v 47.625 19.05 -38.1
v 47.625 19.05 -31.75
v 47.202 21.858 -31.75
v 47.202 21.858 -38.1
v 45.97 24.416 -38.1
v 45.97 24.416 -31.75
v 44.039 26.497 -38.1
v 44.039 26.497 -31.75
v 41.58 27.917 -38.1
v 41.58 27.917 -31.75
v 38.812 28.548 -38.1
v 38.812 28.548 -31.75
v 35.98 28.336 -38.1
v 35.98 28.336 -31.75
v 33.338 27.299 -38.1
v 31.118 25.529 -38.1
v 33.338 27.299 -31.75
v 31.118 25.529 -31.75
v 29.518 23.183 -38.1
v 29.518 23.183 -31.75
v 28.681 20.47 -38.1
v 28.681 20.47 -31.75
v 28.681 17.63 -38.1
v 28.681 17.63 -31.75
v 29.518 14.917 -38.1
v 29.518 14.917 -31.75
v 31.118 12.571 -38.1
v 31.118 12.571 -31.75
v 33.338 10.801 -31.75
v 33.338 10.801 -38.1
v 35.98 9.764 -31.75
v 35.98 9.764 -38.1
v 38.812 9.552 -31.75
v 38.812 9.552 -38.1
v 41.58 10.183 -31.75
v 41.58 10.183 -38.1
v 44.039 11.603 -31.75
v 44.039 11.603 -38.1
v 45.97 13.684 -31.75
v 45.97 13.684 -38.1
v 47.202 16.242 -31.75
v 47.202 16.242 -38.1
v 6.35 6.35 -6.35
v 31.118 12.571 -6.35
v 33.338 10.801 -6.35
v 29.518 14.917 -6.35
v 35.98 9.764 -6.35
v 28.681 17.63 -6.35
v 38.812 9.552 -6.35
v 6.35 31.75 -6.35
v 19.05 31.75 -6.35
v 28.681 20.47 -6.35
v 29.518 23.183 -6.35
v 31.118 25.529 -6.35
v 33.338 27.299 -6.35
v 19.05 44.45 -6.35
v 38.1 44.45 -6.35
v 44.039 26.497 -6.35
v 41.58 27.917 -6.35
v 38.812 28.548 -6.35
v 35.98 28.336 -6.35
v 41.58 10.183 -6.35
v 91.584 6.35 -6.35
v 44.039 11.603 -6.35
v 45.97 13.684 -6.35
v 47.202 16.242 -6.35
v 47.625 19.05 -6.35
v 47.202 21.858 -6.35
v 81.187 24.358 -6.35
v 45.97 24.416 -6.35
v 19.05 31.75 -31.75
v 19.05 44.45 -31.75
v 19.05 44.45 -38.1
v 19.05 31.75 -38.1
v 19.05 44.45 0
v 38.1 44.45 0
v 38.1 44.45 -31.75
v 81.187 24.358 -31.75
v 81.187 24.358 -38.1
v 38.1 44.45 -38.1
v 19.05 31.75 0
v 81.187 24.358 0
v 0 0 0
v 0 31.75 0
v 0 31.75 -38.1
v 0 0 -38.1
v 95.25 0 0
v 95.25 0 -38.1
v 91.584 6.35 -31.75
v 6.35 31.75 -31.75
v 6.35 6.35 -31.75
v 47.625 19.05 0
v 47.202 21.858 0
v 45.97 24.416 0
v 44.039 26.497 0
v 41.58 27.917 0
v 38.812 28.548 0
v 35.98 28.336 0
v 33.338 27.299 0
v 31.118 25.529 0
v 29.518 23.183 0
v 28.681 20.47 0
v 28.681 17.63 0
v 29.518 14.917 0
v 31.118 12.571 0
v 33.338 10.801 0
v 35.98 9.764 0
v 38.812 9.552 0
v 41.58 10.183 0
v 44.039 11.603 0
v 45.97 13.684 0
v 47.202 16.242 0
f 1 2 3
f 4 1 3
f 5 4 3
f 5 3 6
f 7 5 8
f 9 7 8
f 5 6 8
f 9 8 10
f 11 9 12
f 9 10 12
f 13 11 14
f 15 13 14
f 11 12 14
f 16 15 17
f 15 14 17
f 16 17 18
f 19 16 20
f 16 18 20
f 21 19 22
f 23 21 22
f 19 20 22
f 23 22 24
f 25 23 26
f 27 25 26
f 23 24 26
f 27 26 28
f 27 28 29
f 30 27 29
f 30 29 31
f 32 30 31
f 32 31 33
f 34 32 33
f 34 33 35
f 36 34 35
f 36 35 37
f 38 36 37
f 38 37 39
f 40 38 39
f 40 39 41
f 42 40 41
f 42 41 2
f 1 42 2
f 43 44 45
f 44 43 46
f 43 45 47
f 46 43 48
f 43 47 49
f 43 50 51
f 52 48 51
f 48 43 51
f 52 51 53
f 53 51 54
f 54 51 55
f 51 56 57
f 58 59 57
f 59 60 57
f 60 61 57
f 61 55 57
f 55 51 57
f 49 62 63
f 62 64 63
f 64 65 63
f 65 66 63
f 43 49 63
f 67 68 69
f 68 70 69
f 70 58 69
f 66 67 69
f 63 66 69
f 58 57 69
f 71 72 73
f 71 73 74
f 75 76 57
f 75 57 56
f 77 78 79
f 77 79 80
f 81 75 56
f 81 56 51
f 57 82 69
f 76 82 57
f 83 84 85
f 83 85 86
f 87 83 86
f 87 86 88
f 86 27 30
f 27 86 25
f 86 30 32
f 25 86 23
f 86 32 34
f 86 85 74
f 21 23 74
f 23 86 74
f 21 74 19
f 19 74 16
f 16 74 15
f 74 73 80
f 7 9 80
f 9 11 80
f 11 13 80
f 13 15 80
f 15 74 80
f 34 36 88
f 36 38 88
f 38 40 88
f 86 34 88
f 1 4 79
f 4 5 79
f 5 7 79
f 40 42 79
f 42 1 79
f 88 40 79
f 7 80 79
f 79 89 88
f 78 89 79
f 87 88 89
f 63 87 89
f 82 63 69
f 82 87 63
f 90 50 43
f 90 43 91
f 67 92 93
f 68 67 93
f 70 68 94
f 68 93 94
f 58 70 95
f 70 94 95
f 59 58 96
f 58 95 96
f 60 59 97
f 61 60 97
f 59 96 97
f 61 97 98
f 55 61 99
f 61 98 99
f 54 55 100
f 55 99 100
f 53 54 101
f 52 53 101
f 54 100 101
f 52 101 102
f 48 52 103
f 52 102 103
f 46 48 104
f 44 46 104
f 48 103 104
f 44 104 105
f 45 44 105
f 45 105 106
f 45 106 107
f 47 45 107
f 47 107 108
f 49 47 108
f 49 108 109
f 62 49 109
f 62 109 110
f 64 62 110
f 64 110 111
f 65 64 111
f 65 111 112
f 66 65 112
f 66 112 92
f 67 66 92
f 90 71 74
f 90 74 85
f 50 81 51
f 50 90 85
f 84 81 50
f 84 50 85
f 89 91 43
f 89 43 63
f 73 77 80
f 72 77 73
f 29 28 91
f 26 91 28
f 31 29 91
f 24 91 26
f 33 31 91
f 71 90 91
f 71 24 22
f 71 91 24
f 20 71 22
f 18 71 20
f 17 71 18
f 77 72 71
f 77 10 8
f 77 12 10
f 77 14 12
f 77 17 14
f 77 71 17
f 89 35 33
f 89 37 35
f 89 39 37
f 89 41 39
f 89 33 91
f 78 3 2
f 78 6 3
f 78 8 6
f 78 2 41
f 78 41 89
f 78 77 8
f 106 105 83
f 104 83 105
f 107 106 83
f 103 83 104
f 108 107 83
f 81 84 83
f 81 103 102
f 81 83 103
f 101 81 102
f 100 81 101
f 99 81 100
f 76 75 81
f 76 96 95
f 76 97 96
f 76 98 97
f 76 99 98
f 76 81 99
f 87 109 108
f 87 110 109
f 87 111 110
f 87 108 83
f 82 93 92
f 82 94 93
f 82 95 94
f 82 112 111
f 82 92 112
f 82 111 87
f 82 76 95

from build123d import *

# Parameters (mm, degrees)
BOSS_EXTRUDE1_DEPTH = 38.1
SKETCH2_R           = 9.525
CUT_EXTRUDE1_DEPTH  = 39.1
SKETCH3_W           = 88.9
SKETCH3_H           = 25.4
CUT_EXTRUDE2_DEPTH  = 38.1


with BuildPart() as part:
    # Sketch1 → Boss-Extrude1 (new body)
    with BuildSketch(Plane.XY):
        Polygon((0, 0), (95.25, 0), (81.186706555, 24.358338769), (38.1, 44.45), (19.05, 44.45), (19.05, 31.75), (0, 31.75), align=None)
    extrude(amount=-BOSS_EXTRUDE1_DEPTH)

    # Sketch2 → Cut-Extrude1 (cut, through all)
    with BuildSketch(Plane.XY):
        with Locations((38.1, 19.05)):
            Circle(SKETCH2_R)
    extrude(amount=-CUT_EXTRUDE1_DEPTH, mode=Mode.SUBTRACT)

    # Sketch3 → Cut-Extrude2 (cut)
    with BuildSketch(Plane(origin=(0, 44.45, 0), x_dir=(1, 0, 0), z_dir=(0, 1, 0))):
        with Locations((50.8, 19.05)):
            Rectangle(SKETCH3_W, SKETCH3_H)
    extrude(amount=-CUT_EXTRUDE2_DEPTH, mode=Mode.SUBTRACT)


solid = part.part
